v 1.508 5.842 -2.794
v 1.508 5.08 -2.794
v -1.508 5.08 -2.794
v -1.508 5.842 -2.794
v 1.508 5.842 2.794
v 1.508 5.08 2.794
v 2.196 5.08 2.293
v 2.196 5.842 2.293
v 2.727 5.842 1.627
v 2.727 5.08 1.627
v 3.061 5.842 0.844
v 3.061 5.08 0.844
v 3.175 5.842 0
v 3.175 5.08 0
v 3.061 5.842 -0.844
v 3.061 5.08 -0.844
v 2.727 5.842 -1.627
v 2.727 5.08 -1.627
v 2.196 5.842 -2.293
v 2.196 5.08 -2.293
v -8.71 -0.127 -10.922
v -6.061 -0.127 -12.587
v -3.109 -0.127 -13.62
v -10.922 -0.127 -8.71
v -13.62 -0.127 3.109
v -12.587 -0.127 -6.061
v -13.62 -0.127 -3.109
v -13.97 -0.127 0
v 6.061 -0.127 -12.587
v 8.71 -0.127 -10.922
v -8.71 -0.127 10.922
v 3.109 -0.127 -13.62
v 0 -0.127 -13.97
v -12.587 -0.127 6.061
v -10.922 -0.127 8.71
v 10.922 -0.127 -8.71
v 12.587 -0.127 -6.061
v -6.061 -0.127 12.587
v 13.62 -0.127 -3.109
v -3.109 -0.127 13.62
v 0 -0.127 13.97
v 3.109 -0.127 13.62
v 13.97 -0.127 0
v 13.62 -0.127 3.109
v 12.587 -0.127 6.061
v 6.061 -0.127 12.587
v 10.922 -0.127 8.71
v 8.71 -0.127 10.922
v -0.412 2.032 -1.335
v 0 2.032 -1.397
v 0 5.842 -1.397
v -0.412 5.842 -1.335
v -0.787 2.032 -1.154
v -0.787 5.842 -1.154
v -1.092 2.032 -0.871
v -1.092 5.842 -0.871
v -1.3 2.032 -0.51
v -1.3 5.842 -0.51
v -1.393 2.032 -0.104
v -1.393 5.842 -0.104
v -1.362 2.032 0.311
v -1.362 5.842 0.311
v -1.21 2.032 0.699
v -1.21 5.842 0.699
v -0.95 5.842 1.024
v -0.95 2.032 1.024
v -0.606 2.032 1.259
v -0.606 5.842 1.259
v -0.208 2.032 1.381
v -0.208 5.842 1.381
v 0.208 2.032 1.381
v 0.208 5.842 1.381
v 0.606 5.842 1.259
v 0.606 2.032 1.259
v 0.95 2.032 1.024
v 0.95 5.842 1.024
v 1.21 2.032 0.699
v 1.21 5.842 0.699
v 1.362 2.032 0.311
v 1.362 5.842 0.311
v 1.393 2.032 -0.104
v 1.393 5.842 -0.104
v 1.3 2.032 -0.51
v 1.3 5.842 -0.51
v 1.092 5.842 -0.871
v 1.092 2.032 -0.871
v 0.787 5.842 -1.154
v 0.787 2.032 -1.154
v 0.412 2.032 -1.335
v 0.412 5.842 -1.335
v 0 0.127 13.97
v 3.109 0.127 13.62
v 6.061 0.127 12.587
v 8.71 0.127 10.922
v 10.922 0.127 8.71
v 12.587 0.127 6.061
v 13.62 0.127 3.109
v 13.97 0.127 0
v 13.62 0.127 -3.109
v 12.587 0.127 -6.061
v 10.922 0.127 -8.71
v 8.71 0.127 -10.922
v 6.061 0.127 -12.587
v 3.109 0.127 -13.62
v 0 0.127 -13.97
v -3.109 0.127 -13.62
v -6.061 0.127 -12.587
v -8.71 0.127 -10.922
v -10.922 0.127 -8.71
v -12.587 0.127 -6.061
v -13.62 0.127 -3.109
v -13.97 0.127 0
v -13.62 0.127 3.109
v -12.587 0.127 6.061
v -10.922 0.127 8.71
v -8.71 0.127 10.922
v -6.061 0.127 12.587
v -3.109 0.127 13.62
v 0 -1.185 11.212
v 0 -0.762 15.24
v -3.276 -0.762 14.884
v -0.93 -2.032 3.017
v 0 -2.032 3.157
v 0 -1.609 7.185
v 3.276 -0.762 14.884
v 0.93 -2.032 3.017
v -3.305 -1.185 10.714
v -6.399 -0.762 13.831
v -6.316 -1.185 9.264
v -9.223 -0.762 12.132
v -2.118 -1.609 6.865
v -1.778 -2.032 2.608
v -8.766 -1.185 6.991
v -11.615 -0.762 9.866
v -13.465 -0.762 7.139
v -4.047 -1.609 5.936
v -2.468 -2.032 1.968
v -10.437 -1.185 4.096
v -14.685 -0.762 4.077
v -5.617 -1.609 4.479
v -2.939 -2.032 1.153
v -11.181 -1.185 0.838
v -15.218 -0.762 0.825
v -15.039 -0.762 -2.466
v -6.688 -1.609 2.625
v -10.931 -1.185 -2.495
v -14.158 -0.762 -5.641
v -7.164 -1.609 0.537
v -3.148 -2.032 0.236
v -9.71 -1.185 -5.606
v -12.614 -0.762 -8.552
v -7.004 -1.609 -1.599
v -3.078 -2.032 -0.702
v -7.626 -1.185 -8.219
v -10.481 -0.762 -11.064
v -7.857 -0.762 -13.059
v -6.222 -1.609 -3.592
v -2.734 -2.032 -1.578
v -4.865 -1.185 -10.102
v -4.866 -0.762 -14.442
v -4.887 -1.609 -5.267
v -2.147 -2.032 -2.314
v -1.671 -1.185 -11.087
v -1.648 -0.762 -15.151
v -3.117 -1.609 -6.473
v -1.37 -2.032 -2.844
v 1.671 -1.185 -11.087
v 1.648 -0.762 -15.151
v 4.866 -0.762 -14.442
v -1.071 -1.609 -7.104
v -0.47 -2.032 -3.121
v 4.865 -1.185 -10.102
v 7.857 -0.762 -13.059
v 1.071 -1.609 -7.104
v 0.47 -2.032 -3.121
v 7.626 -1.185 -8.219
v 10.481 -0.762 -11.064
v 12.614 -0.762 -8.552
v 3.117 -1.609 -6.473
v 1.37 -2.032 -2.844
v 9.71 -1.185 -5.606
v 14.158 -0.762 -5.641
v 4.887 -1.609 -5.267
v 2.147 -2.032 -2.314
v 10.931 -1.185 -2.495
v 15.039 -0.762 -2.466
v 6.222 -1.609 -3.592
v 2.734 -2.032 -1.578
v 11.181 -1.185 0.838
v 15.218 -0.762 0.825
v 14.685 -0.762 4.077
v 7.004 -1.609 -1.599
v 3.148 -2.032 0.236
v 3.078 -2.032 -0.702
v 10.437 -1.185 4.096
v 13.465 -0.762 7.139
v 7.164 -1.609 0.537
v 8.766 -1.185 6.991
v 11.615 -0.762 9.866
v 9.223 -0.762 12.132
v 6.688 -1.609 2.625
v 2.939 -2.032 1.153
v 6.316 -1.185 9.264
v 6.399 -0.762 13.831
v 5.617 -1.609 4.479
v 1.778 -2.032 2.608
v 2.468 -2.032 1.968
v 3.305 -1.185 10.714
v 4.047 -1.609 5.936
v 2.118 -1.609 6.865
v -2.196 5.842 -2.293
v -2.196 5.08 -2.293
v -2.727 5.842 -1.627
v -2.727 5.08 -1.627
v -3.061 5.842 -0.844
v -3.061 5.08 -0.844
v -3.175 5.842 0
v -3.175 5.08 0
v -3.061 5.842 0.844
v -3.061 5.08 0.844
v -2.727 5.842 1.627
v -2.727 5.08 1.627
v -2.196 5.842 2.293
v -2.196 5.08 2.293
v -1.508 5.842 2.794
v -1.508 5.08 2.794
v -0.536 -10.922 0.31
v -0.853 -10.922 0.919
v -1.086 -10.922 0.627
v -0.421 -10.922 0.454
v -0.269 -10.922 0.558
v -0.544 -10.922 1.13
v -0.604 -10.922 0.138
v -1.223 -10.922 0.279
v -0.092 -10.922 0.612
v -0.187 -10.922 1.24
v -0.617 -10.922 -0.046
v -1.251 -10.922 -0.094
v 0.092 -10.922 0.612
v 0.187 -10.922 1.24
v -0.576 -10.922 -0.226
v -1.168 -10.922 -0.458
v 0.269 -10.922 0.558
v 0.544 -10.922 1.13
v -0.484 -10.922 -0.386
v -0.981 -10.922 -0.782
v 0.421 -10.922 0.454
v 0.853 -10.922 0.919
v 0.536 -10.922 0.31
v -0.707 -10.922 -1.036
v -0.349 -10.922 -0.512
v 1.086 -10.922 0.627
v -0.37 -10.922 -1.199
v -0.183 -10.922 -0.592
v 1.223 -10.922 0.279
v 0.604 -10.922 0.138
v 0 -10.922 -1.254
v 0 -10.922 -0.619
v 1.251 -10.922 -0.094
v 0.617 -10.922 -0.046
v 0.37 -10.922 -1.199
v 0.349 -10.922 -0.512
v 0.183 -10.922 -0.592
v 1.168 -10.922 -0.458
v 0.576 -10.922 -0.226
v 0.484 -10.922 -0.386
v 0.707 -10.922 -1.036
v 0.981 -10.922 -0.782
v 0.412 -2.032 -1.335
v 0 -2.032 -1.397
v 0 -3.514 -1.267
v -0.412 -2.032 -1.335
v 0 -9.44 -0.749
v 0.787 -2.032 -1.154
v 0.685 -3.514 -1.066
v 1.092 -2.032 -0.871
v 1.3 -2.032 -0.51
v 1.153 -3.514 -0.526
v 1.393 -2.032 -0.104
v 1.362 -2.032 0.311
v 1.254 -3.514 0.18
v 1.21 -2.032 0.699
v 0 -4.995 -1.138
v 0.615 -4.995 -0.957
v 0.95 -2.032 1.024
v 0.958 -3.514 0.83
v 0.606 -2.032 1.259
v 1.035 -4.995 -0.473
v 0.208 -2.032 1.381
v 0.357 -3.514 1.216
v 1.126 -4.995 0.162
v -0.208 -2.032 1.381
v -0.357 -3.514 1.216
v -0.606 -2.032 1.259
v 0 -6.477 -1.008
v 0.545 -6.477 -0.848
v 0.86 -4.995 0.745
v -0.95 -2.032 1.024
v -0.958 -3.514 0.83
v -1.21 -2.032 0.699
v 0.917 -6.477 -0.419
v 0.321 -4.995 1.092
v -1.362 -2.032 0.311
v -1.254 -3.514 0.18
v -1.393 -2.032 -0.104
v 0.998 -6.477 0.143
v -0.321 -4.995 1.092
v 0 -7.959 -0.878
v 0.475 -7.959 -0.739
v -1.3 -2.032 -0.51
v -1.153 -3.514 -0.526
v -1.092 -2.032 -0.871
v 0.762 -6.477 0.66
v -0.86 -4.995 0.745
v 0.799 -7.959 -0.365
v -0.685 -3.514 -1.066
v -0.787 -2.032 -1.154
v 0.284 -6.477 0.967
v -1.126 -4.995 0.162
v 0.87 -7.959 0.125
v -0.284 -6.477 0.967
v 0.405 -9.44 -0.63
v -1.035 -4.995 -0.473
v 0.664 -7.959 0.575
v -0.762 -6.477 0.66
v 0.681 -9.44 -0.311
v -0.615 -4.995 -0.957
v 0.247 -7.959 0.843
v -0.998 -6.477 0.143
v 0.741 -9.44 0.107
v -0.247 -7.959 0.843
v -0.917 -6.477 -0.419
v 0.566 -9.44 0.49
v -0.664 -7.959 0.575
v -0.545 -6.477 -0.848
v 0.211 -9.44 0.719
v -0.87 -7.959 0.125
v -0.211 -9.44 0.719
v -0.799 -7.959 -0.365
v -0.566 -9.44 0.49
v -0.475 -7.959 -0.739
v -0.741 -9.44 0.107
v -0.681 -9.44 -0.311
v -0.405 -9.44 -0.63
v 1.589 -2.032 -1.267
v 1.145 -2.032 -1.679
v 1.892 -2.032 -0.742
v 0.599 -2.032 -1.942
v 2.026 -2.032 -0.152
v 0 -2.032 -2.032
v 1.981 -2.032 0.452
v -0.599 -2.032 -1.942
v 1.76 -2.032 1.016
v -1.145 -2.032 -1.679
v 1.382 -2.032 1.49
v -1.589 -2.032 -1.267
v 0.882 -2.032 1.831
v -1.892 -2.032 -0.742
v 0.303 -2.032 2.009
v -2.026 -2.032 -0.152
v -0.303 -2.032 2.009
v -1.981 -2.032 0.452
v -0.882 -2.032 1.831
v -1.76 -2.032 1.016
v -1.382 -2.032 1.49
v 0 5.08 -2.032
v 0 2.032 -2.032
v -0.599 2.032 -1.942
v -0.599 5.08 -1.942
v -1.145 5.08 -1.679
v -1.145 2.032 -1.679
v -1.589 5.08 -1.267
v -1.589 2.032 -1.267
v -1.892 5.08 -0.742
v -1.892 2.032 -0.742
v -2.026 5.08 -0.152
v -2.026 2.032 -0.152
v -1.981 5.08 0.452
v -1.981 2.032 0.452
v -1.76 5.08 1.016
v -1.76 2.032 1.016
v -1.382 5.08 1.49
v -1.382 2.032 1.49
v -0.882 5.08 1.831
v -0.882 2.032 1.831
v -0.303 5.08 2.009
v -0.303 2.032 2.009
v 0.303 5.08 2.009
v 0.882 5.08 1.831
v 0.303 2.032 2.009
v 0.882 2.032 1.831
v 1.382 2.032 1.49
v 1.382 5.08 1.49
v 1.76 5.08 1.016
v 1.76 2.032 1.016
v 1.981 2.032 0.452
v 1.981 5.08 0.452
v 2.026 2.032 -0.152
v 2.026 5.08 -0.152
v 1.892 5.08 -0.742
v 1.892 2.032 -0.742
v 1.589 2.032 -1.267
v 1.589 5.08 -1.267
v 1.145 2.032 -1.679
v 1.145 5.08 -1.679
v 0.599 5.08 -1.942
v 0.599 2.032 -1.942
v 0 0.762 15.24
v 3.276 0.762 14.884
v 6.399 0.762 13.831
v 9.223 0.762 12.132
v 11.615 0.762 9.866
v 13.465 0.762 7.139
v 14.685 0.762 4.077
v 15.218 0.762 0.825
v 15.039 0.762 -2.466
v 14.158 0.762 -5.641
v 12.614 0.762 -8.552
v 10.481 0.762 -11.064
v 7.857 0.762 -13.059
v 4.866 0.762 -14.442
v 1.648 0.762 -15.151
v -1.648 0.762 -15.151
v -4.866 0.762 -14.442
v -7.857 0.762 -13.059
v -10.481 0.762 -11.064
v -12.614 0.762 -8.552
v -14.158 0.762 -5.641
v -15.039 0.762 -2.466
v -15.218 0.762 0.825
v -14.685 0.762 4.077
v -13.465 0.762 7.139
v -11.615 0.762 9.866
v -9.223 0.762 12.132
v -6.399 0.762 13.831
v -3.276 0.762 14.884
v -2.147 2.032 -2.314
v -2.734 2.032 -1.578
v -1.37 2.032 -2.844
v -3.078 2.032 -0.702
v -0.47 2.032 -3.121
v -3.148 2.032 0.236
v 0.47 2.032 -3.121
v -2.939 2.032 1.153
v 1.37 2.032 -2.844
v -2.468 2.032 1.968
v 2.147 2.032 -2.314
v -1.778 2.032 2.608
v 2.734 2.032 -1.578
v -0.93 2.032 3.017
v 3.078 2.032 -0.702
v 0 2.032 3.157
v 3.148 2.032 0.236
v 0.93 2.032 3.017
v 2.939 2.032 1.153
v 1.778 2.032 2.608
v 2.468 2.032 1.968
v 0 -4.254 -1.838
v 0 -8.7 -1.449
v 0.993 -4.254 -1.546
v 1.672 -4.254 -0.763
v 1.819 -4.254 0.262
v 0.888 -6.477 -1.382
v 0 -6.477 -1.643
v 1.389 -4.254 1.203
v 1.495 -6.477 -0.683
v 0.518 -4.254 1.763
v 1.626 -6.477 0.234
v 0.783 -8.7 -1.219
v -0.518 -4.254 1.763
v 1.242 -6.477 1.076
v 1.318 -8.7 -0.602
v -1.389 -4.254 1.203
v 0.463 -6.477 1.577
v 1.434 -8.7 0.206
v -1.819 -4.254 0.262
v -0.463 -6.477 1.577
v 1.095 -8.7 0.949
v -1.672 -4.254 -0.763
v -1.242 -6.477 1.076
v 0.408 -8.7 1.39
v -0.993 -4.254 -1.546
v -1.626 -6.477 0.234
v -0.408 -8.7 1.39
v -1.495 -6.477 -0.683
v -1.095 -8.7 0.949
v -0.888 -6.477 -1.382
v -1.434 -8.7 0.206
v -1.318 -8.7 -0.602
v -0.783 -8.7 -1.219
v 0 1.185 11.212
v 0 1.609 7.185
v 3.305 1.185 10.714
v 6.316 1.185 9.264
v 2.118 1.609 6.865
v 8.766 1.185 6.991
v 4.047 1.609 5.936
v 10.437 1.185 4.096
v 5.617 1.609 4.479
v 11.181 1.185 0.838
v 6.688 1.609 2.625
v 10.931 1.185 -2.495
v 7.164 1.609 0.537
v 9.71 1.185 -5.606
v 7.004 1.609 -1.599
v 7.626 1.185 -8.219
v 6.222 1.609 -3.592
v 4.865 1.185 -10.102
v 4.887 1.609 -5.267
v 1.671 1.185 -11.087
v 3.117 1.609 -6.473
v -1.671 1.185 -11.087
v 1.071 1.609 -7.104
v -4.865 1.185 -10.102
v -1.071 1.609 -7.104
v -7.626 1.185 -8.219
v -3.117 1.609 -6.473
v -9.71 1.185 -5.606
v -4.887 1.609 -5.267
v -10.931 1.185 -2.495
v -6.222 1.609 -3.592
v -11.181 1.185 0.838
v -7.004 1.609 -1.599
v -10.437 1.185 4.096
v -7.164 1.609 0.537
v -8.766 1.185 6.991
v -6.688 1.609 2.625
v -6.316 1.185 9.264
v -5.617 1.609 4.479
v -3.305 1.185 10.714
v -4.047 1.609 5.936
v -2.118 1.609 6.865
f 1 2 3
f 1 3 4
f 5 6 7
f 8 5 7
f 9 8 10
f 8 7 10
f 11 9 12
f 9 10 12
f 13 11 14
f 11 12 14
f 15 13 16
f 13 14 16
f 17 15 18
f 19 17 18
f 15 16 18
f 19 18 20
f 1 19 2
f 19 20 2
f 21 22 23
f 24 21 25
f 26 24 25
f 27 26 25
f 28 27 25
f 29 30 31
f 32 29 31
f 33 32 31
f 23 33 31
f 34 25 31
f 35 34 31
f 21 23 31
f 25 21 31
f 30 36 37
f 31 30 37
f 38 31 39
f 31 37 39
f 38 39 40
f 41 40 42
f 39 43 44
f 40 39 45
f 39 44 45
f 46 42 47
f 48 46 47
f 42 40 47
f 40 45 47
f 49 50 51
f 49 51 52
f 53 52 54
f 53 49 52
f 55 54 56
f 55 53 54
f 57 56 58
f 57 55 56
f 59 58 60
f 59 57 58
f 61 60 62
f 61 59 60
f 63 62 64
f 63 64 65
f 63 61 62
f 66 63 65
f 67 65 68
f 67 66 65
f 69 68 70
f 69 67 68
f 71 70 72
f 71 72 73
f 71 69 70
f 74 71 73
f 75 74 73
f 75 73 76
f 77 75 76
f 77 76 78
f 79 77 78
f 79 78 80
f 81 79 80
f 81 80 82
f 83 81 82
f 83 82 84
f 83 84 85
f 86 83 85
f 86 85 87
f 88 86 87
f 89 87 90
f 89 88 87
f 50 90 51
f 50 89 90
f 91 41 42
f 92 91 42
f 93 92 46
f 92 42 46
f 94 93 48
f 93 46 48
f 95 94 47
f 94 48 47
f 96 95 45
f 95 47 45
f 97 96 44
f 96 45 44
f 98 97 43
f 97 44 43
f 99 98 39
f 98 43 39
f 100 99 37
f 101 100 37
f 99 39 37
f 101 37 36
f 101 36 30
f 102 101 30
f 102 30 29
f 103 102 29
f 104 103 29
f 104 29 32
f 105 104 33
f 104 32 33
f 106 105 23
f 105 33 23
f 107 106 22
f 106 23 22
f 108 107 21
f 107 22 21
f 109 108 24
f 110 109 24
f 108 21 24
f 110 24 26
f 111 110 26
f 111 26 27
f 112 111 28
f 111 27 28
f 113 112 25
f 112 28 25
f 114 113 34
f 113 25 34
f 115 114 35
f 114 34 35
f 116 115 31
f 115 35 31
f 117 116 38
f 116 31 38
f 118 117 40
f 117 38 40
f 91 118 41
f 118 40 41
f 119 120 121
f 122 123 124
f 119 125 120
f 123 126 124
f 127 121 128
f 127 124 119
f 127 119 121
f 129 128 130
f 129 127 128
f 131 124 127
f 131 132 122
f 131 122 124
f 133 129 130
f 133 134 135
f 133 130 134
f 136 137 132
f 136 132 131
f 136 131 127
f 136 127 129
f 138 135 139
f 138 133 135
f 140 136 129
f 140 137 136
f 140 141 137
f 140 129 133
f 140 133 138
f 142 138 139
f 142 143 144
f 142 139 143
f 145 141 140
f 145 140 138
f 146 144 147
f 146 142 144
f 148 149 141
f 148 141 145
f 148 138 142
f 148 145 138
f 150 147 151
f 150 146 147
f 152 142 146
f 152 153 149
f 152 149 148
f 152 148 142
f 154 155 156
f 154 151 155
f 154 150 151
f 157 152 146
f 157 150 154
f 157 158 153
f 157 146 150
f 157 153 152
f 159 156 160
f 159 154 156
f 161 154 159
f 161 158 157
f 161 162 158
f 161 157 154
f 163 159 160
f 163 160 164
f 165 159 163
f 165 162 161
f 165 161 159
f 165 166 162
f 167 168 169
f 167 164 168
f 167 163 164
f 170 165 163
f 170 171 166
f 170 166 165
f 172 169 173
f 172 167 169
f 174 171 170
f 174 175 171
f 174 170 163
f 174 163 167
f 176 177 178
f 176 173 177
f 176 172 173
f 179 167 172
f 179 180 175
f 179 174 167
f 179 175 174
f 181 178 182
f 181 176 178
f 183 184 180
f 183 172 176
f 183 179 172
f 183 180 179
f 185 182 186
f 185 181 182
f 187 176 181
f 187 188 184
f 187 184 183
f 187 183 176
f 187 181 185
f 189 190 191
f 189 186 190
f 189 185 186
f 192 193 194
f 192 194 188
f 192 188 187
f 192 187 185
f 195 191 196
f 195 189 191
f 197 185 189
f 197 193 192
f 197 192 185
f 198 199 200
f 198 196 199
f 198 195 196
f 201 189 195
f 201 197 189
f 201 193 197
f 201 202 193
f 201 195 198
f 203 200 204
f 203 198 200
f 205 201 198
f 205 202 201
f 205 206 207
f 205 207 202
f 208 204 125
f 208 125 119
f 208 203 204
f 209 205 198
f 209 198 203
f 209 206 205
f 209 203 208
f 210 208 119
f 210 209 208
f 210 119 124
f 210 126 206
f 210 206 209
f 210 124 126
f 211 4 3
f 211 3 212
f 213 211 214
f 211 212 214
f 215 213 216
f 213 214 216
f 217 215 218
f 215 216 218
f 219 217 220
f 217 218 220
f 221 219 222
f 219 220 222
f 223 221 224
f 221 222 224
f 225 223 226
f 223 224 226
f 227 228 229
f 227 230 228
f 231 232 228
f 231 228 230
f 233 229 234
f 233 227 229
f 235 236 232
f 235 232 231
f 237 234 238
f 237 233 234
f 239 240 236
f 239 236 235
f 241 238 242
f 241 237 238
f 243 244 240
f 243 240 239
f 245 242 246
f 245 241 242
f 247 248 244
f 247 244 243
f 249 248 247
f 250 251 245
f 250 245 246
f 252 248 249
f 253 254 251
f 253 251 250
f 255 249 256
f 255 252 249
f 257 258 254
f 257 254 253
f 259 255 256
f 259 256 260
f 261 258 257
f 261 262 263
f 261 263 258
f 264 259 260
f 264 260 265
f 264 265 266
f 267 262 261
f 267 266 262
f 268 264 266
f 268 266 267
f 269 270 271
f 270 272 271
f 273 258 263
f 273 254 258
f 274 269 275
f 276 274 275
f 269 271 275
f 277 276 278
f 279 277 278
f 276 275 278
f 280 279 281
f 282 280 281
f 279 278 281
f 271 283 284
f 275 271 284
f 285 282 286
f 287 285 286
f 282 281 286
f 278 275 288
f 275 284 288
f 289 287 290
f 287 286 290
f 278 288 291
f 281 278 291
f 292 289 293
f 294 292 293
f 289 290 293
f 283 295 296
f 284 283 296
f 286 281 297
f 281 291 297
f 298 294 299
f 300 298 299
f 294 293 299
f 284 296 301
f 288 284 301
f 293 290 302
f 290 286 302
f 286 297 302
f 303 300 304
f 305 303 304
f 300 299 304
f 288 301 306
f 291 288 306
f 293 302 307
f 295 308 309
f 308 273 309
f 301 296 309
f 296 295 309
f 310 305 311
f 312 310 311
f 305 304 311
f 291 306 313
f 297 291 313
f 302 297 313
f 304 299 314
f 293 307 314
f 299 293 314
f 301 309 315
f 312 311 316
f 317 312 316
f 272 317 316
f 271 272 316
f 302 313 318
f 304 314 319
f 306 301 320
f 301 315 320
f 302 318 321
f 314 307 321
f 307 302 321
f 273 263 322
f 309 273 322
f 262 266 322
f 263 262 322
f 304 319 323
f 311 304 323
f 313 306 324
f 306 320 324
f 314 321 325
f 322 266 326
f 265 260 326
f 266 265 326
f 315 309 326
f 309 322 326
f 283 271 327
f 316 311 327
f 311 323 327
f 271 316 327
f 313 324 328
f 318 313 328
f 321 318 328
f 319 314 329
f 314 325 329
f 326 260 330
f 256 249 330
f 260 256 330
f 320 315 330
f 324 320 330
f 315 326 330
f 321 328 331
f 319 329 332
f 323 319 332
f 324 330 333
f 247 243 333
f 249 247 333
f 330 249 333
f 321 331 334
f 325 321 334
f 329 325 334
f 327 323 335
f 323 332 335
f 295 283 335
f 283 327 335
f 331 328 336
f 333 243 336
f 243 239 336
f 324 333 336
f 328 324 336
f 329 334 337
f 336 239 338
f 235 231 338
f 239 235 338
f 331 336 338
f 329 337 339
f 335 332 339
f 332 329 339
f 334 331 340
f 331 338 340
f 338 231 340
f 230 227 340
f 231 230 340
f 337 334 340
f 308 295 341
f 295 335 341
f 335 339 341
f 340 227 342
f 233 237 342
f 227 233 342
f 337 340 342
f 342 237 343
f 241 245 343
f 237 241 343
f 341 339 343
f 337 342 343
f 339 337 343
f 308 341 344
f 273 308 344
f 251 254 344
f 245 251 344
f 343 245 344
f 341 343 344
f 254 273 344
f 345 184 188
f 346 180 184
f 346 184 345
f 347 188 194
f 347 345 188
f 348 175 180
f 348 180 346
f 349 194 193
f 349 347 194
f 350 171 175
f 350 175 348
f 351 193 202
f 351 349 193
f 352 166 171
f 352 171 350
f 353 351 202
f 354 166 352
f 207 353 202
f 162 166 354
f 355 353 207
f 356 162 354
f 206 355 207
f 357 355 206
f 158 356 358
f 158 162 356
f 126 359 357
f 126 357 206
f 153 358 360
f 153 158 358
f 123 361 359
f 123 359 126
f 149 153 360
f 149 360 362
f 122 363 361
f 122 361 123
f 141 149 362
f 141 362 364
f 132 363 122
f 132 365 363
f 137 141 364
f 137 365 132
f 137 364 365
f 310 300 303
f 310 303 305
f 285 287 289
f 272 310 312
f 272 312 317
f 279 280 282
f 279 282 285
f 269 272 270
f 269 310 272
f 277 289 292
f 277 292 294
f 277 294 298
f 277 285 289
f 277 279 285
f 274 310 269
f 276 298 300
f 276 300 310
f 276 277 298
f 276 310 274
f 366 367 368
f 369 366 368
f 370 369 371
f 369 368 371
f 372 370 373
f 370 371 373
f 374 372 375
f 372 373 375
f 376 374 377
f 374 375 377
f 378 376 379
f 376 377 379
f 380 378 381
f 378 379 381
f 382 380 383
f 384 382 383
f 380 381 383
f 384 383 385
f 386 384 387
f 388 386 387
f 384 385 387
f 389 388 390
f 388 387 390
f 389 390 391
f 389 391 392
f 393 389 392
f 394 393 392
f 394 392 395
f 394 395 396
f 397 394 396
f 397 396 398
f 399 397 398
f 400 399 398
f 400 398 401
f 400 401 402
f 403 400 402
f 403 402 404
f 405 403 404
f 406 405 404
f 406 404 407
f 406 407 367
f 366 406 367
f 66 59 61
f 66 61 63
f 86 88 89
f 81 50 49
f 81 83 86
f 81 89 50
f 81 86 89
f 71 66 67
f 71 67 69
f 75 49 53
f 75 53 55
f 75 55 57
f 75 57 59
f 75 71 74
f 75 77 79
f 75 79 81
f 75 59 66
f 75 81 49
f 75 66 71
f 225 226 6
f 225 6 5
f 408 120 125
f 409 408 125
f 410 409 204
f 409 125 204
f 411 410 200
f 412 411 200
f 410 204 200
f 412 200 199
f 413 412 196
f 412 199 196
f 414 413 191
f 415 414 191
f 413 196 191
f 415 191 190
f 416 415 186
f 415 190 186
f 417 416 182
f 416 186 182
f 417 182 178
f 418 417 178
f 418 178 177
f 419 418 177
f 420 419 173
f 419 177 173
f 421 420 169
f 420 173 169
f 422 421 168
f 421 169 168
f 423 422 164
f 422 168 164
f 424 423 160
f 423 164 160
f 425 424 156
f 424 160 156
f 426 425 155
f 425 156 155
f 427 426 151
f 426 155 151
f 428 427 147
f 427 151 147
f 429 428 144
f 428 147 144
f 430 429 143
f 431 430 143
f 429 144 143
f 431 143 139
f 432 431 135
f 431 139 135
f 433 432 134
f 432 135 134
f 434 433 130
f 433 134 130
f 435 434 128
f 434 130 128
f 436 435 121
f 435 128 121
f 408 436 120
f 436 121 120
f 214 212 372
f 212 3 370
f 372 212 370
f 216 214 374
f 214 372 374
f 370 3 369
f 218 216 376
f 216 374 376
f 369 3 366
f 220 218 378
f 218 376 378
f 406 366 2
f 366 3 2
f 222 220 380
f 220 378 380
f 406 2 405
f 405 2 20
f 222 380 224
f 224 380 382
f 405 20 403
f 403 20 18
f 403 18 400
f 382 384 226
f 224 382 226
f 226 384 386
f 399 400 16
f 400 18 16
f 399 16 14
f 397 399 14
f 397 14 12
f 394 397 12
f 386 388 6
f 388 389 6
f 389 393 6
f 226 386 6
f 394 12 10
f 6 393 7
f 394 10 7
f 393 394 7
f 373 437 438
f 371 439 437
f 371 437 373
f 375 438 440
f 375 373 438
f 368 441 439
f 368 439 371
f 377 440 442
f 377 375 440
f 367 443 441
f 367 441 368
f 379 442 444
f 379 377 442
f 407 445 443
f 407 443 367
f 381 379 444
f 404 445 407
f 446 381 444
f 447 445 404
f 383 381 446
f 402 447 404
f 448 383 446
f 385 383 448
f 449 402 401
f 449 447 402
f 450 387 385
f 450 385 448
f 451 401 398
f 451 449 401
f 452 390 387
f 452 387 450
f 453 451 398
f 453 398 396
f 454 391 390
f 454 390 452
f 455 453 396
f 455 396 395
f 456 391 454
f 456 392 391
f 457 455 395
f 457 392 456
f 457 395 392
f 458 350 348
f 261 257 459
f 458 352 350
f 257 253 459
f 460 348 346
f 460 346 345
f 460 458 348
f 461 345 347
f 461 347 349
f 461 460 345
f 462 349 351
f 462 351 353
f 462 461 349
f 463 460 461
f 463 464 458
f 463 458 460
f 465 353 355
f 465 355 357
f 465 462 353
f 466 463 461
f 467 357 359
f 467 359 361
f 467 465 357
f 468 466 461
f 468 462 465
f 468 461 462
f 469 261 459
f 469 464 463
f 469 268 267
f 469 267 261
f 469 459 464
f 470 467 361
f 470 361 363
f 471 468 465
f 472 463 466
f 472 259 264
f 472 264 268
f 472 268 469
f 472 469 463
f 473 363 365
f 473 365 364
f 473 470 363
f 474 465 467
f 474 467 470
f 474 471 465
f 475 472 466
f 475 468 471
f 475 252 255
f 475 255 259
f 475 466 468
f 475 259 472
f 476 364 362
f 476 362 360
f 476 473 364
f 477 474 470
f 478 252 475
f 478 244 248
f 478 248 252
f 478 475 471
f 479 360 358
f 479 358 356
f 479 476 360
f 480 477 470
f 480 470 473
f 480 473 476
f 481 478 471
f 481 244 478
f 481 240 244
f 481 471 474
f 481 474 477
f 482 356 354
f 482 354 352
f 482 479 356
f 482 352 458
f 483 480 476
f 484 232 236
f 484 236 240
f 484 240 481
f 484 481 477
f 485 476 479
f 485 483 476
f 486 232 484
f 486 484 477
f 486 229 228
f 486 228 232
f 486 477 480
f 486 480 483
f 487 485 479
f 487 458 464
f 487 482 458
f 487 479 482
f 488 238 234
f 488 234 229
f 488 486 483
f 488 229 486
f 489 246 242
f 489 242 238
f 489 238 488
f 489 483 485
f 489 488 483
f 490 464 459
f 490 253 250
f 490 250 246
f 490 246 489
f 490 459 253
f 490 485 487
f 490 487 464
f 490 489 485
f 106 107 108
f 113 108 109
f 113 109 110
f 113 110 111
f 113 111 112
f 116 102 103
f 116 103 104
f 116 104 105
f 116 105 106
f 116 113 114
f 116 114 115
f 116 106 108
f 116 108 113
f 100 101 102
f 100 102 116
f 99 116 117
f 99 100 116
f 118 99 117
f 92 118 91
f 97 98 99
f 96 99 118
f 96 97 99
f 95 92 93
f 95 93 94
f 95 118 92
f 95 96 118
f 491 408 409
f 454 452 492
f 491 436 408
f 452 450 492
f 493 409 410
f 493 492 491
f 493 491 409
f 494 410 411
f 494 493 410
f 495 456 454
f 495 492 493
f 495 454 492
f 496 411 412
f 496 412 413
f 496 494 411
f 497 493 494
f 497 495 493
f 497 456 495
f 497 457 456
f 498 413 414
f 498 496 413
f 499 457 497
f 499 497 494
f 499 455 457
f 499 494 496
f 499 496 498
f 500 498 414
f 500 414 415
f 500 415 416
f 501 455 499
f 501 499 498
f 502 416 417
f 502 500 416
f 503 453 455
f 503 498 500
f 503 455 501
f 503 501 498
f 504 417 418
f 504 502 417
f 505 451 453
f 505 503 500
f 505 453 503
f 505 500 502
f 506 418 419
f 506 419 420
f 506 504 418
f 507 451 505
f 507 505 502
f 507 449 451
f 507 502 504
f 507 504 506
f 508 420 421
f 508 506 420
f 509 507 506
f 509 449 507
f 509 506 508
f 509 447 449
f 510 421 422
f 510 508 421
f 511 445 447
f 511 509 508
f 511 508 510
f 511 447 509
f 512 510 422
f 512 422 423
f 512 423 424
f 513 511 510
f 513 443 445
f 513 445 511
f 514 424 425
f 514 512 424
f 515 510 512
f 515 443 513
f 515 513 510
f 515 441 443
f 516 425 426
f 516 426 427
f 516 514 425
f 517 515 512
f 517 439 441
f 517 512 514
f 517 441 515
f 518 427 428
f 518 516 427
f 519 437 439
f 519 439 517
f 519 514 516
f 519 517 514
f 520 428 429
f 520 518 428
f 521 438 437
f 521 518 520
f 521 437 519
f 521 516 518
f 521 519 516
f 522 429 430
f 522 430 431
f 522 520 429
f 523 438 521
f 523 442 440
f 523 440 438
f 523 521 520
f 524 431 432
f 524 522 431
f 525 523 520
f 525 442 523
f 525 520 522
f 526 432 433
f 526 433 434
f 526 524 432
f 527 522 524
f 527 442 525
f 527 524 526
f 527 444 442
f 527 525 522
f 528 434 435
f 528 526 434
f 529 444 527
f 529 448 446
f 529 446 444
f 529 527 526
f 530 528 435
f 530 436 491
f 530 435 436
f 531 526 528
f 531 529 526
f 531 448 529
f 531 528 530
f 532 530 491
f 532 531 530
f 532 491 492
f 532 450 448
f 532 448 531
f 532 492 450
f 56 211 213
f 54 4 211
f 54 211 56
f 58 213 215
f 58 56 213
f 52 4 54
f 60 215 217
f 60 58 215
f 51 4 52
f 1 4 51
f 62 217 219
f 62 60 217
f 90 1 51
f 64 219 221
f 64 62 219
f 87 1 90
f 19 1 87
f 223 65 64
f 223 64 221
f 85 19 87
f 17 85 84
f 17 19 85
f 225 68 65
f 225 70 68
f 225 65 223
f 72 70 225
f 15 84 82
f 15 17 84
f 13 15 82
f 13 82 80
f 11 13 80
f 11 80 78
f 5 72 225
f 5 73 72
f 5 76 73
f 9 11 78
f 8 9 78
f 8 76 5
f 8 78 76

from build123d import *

# Parameters (mm, degrees)
BOSS_EXTRUDE1_DEPTH      = 0.762
BOSS_EXTRUDE1_DEPTH_BACK = 0.762
SKETCH1_R                = 15.24
BOSS_EXTRUDE2_DEPTH      = 0.127
BOSS_EXTRUDE2_DEPTH_BACK = 0.127
SKETCH2_R                = 13.97
SKETCH3_R                = 15.24
BOSS_EXTRUDE3_DEPTH      = 1.27
BOSS_EXTRUDE3_TAPER      = 84
SKETCH4_R                = 15.24
BOSS_EXTRUDE4_DEPTH      = 1.27
BOSS_EXTRUDE4_TAPER      = 84
SKETCH5_R                = 2.032
SKETCH5_R_2              = 1.397
BOSS_EXTRUDE5_DEPTH      = 3.81
BOSS_EXTRUDE6_START      = -0.762
SKETCH6_R                = 3.175
SKETCH6_R_2              = 2.032
BOSS_EXTRUDE6_DEPTH      = 0.762
CUT_EXTRUDE1_DEPTH       = 23.330341916
CUT_EXTRUDE1_DEPTH_BACK  = 23.330341916
SKETCH7_W                = 0.381
SKETCH7_H                = 0.762
SKETCH8_R                = 2.032
BOSS_EXTRUDE7_DEPTH      = 8.89
BOSS_EXTRUDE7_TAPER      = 5
SKETCH8_3_R              = 1.397
CUT_EXTRUDE2_DEPTH       = 8.89
CUT_EXTRUDE2_TAPER       = 5


with BuildPart() as part:
    # Sketch1 → Boss-Extrude1 (new, two sides: drawn at the far end of the back side and taken through both)
    with BuildSketch(Plane(origin=(0, 0, 0), x_dir=(1, 0, 0), z_dir=(0, 1, 0)).offset(-BOSS_EXTRUDE1_DEPTH_BACK)):
        Circle(SKETCH1_R)
    extrude(amount=BOSS_EXTRUDE1_DEPTH + BOSS_EXTRUDE1_DEPTH_BACK)

    # Sketch3 → Boss-Extrude3 (add)
    with BuildSketch(Plane(origin=(0, 0.762, 0), x_dir=(1, 0, 0), z_dir=(0, 1, 0))):
        Circle(SKETCH3_R)
    extrude(amount=BOSS_EXTRUDE3_DEPTH, taper=BOSS_EXTRUDE3_TAPER)

    # Sketch4 → Boss-Extrude4 (add)
    with BuildSketch(Plane.XZ.offset(0.762)):
        Circle(SKETCH4_R)
    extrude(amount=BOSS_EXTRUDE4_DEPTH, taper=BOSS_EXTRUDE4_TAPER)

    # Sketch5 → Boss-Extrude5 (add)
    with BuildSketch(Plane(origin=(0, 2.032, 0), x_dir=(1, 0, 0), z_dir=(0, 1, 0))):
        Circle(SKETCH5_R)
        Circle(SKETCH5_R_2, mode=Mode.SUBTRACT)
    extrude(amount=BOSS_EXTRUDE5_DEPTH)

    # Sketch6 → Boss-Extrude6 (add)
    with BuildSketch(Plane(origin=(0, 5.842, 0), x_dir=(1, 0, 0), z_dir=(0, 1, 0)).offset(BOSS_EXTRUDE6_START)):
        Circle(SKETCH6_R)
        Circle(SKETCH6_R_2, mode=Mode.SUBTRACT)
    extrude(amount=BOSS_EXTRUDE6_DEPTH)

    # Sketch7 → Cut-Extrude1 (cut, two sides: drawn at the far end of the back side and taken through both)
    with BuildSketch(Plane(origin=(0, 0, 0), x_dir=(0, 0, -1), z_dir=(1, 0, 0)).offset(-CUT_EXTRUDE1_DEPTH_BACK)):
        with Locations((-2.9845, 5.461)):
            Rectangle(SKETCH7_W, SKETCH7_H)
        with Locations((2.9845, 5.461)):
            Rectangle(SKETCH7_W, SKETCH7_H)
    extrude(amount=CUT_EXTRUDE1_DEPTH + CUT_EXTRUDE1_DEPTH_BACK, mode=Mode.SUBTRACT)

    # Sketch8 → Boss-Extrude7 (add)
    with BuildSketch(Plane.XZ.offset(2.032)):
        Circle(SKETCH8_R)
    extrude(amount=BOSS_EXTRUDE7_DEPTH, taper=BOSS_EXTRUDE7_TAPER)

    # Sketch8<3> → Cut-Extrude2 (cut)
    with BuildSketch(Plane.XZ.offset(2.032)):
        Circle(SKETCH8_3_R)
    extrude(amount=CUT_EXTRUDE2_DEPTH, taper=CUT_EXTRUDE2_TAPER, mode=Mode.SUBTRACT)


with BuildPart() as body_2:
    # Sketch2 → Boss-Extrude2 (new, two sides: drawn at the far end of the back side and taken through both)
    with BuildSketch(Plane(origin=(0, 0, 0), x_dir=(1, 0, 0), z_dir=(0, 1, 0)).offset(-BOSS_EXTRUDE2_DEPTH_BACK)):
        Circle(SKETCH2_R)
    extrude(amount=BOSS_EXTRUDE2_DEPTH + BOSS_EXTRUDE2_DEPTH_BACK)


solid = Compound([part.part, body_2.part])
